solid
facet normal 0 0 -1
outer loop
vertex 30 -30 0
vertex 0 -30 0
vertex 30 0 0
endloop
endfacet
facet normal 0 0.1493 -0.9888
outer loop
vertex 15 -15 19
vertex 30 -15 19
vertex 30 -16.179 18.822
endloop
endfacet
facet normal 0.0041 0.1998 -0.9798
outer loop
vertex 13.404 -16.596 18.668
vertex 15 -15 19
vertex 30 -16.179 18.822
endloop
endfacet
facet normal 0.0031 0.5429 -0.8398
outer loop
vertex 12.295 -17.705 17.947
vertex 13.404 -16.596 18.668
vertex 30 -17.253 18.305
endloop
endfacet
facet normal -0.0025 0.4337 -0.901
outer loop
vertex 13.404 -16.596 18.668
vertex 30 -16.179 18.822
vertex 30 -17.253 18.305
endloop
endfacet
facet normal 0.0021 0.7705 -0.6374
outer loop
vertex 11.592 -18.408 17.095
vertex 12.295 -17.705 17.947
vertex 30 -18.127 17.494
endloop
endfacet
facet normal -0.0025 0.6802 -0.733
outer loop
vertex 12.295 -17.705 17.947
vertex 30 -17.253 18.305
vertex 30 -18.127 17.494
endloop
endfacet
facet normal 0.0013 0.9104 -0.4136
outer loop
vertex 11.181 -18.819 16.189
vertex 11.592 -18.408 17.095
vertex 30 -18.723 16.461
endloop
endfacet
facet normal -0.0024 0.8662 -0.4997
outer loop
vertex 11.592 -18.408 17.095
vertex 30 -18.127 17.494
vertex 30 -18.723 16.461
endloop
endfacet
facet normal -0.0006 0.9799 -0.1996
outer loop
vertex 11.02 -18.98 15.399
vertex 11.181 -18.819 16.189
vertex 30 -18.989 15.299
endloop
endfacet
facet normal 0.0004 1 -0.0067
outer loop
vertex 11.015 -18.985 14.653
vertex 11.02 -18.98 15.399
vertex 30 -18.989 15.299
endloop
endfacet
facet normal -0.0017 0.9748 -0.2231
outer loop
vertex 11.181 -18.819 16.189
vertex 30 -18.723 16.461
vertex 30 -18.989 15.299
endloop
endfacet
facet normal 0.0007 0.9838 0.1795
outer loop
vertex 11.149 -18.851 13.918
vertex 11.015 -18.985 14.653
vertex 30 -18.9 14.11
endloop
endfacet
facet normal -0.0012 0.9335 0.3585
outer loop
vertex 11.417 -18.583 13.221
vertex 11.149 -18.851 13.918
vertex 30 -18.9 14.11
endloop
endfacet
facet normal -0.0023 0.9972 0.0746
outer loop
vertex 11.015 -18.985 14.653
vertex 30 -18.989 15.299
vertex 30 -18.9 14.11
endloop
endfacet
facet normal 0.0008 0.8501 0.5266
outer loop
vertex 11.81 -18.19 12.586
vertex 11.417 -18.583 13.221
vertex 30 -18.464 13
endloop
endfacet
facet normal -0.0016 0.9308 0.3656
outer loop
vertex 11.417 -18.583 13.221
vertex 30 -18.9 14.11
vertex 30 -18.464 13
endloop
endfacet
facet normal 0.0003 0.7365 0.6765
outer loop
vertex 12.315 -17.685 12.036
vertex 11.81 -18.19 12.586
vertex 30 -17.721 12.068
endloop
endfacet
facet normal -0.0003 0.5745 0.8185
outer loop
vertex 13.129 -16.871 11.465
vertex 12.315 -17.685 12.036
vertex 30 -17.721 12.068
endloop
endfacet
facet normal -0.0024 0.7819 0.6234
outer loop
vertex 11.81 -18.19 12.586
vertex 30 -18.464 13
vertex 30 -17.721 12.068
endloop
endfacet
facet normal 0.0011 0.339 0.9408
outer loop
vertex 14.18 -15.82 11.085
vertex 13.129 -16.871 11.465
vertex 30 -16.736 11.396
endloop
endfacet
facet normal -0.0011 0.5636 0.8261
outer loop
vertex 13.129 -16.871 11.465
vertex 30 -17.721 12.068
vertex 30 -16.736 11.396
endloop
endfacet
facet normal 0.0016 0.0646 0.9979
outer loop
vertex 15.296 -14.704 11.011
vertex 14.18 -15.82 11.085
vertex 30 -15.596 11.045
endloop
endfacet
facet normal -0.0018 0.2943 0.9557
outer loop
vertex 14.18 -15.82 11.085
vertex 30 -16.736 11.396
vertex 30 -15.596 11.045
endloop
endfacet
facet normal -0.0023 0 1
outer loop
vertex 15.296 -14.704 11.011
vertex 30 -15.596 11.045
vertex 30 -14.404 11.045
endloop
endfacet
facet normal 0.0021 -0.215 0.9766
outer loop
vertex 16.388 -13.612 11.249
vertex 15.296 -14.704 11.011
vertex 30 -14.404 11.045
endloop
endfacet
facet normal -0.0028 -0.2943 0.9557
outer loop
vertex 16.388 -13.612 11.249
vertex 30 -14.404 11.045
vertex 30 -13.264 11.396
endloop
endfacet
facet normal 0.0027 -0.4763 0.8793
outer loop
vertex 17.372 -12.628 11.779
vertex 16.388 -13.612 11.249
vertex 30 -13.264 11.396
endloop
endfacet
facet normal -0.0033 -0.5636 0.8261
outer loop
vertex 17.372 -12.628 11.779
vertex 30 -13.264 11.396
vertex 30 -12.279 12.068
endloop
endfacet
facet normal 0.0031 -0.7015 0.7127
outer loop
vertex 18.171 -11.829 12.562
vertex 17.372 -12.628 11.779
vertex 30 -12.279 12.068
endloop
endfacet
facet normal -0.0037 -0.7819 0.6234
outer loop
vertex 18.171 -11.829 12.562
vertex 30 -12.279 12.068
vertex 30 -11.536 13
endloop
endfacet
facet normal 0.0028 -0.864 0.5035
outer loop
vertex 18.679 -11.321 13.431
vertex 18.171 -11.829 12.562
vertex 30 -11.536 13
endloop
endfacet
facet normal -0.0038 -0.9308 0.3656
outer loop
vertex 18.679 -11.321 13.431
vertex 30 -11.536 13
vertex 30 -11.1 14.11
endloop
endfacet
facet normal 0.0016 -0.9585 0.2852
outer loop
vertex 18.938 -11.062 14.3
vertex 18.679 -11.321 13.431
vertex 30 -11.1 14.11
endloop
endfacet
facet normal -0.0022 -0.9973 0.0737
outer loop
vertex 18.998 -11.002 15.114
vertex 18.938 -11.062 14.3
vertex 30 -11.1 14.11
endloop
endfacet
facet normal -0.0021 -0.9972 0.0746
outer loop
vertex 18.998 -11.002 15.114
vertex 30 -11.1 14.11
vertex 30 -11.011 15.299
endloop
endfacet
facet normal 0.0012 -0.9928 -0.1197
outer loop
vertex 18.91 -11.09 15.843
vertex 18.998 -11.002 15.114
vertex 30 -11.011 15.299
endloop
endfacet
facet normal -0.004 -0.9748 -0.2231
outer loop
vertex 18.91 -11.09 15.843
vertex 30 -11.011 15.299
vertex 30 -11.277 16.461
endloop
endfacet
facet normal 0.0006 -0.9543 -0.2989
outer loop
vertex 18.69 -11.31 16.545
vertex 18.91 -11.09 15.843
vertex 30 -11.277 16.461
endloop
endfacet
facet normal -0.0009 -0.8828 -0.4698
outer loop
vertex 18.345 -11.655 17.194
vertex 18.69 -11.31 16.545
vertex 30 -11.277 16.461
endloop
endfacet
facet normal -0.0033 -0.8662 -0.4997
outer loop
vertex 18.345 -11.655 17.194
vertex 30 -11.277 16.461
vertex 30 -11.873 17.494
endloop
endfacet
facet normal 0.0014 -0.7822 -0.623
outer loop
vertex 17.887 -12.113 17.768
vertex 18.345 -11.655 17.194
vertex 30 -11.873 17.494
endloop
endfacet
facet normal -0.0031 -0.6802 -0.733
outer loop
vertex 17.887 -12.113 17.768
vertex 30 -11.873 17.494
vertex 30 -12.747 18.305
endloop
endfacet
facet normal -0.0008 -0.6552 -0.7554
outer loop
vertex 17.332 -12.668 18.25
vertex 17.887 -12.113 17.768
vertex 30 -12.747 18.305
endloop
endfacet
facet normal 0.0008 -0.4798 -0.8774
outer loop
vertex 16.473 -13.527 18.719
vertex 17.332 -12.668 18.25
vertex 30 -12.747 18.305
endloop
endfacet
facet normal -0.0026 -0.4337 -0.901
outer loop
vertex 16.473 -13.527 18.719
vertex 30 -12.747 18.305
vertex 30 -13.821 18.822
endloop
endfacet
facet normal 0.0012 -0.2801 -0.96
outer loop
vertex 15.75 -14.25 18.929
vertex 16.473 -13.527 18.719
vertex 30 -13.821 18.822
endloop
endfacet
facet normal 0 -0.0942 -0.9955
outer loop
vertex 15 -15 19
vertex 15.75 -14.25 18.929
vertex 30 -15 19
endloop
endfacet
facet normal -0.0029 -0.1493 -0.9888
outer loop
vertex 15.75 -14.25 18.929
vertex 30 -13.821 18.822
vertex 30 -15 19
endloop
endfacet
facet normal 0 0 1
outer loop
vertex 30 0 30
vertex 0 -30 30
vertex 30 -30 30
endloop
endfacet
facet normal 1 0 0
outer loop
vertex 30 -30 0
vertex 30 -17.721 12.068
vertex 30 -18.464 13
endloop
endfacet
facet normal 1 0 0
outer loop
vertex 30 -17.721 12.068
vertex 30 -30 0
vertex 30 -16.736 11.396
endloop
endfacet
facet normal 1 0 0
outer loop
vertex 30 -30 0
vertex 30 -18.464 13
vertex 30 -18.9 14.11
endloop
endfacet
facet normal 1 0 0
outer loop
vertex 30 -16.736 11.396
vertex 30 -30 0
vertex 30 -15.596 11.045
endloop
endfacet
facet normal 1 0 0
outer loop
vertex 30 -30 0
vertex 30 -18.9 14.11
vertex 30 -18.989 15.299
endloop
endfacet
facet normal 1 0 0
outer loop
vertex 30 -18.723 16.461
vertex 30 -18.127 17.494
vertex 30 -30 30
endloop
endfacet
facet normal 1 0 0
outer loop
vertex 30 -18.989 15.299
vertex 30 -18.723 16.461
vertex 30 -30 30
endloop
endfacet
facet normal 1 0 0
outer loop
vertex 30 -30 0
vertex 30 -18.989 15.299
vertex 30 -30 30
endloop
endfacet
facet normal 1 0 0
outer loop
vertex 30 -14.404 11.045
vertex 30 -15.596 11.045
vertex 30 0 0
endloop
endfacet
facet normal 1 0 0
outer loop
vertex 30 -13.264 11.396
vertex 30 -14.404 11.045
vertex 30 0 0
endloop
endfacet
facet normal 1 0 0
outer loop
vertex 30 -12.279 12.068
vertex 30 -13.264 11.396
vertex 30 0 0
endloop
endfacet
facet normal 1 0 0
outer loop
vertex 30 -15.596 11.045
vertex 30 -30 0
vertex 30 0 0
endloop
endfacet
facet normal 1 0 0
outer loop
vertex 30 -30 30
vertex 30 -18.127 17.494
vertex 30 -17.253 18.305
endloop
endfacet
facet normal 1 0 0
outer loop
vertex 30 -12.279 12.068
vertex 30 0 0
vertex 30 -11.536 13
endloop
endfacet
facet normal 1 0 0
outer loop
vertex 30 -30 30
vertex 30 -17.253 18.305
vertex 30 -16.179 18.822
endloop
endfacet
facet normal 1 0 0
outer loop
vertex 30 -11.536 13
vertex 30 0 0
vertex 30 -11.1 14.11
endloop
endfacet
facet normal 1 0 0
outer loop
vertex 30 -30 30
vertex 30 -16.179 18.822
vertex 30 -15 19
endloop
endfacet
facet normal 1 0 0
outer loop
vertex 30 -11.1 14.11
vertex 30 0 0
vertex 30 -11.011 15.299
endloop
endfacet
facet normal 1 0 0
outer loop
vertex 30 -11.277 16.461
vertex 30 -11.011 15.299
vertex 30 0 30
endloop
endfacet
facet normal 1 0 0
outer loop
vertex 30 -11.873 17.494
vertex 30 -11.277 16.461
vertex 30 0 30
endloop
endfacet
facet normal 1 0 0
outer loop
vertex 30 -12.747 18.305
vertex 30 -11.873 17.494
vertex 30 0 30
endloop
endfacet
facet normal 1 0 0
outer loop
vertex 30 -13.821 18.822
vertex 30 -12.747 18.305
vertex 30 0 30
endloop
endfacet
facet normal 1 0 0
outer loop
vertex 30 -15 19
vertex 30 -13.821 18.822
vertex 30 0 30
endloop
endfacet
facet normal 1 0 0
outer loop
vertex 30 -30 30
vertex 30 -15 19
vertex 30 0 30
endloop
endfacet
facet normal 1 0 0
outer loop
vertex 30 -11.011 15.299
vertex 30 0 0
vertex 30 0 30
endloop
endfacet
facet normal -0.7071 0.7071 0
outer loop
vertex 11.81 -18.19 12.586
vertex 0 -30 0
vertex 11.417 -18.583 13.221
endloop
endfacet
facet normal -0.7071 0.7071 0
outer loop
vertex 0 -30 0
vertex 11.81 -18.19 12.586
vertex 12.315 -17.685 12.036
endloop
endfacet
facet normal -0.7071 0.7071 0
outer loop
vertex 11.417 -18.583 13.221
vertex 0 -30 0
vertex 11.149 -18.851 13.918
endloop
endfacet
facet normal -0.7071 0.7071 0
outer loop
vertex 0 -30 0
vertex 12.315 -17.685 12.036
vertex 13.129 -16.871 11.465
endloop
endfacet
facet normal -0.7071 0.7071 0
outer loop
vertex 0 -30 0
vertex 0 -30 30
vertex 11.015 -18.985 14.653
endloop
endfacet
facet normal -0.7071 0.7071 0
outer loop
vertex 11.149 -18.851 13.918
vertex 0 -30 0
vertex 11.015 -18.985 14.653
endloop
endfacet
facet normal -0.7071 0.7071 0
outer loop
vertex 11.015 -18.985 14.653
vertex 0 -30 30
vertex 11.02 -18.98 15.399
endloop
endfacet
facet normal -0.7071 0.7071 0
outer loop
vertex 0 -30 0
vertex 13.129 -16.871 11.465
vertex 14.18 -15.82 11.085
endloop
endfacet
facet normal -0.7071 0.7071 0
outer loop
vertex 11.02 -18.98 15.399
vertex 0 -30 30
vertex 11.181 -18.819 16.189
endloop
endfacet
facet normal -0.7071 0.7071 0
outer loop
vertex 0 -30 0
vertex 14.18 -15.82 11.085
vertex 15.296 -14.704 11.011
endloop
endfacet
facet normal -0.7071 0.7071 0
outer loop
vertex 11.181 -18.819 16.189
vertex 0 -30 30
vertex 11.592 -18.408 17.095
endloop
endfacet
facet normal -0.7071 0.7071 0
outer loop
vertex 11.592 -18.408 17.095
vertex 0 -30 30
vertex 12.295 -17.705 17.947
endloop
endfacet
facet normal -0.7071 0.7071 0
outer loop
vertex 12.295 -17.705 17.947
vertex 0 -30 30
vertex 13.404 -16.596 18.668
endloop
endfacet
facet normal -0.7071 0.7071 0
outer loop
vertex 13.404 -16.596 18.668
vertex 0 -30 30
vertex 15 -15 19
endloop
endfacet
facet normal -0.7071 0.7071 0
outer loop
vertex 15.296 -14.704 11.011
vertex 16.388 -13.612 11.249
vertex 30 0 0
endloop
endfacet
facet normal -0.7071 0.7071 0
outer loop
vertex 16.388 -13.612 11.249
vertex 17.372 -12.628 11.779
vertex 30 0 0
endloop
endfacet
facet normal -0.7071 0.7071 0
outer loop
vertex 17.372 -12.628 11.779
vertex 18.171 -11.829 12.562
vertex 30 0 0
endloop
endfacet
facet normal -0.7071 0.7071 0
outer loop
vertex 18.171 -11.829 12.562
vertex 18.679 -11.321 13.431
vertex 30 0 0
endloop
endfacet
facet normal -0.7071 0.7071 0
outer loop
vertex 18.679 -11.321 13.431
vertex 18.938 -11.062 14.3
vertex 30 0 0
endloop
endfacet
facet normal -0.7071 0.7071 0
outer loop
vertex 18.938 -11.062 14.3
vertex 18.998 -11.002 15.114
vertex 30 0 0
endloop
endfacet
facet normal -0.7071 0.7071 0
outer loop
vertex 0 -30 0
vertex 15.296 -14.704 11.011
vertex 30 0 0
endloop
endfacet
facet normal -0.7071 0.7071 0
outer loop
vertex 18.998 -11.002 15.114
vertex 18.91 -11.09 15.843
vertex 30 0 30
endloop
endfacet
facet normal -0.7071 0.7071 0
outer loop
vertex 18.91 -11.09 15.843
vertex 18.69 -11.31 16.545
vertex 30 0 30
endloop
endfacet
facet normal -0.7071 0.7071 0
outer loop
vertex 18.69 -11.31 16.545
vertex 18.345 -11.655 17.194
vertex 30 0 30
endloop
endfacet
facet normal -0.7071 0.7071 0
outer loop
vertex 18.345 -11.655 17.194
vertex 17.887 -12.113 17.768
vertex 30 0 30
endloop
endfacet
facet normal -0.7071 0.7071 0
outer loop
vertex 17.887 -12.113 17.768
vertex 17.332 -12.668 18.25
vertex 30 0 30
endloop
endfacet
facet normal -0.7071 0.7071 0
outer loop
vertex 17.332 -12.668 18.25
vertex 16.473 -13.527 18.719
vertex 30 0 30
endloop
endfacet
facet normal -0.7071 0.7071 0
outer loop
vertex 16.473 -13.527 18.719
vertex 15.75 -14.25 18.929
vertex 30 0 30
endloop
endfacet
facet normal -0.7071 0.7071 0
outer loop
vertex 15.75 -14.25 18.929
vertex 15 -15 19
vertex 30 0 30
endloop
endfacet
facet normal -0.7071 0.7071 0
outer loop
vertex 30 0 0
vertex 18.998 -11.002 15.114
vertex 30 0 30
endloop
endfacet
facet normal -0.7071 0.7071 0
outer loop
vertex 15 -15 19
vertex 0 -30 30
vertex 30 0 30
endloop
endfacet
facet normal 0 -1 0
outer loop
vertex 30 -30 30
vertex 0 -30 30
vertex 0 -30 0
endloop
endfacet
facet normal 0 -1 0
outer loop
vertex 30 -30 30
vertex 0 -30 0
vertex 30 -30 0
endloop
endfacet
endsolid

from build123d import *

# Parameters (mm, degrees)
SKETCH_W        = 30
SKETCH_H        = 30
PAD_DEPTH       = 30
POCKET_DEPTH    = 30.001
SKETCH002_R     = 4
POCKET001_DEPTH = 30.001


with BuildPart() as part:
    # Sketch → Pad (new body)
    with BuildSketch(Plane.XZ):
        with Locations((15, 15)):
            Rectangle(SKETCH_W, SKETCH_H)
    extrude(amount=PAD_DEPTH)

    # Sketch001 (on Face3 of Pad) → Pocket (cut, through all)
    with BuildSketch(Plane(origin=(0, 0, 30), x_dir=(-1, 0, 0), z_dir=(0, 0, 1))):
        Polygon((0, 0), (0, 30), (-30, 0), align=None)
    extrude(amount=-POCKET_DEPTH, mode=Mode.SUBTRACT)

    # Sketch002 (on Face3 of Pocket) → Pocket001 (cut, through all)
    with BuildSketch(Plane(origin=(30, 0, 0), x_dir=(0, 0, 1), z_dir=(1, 0, 0))):
        with Locations((15, 15)):
            Circle(SKETCH002_R)
    extrude(amount=-POCKET001_DEPTH, mode=Mode.SUBTRACT)


solid = part.part
